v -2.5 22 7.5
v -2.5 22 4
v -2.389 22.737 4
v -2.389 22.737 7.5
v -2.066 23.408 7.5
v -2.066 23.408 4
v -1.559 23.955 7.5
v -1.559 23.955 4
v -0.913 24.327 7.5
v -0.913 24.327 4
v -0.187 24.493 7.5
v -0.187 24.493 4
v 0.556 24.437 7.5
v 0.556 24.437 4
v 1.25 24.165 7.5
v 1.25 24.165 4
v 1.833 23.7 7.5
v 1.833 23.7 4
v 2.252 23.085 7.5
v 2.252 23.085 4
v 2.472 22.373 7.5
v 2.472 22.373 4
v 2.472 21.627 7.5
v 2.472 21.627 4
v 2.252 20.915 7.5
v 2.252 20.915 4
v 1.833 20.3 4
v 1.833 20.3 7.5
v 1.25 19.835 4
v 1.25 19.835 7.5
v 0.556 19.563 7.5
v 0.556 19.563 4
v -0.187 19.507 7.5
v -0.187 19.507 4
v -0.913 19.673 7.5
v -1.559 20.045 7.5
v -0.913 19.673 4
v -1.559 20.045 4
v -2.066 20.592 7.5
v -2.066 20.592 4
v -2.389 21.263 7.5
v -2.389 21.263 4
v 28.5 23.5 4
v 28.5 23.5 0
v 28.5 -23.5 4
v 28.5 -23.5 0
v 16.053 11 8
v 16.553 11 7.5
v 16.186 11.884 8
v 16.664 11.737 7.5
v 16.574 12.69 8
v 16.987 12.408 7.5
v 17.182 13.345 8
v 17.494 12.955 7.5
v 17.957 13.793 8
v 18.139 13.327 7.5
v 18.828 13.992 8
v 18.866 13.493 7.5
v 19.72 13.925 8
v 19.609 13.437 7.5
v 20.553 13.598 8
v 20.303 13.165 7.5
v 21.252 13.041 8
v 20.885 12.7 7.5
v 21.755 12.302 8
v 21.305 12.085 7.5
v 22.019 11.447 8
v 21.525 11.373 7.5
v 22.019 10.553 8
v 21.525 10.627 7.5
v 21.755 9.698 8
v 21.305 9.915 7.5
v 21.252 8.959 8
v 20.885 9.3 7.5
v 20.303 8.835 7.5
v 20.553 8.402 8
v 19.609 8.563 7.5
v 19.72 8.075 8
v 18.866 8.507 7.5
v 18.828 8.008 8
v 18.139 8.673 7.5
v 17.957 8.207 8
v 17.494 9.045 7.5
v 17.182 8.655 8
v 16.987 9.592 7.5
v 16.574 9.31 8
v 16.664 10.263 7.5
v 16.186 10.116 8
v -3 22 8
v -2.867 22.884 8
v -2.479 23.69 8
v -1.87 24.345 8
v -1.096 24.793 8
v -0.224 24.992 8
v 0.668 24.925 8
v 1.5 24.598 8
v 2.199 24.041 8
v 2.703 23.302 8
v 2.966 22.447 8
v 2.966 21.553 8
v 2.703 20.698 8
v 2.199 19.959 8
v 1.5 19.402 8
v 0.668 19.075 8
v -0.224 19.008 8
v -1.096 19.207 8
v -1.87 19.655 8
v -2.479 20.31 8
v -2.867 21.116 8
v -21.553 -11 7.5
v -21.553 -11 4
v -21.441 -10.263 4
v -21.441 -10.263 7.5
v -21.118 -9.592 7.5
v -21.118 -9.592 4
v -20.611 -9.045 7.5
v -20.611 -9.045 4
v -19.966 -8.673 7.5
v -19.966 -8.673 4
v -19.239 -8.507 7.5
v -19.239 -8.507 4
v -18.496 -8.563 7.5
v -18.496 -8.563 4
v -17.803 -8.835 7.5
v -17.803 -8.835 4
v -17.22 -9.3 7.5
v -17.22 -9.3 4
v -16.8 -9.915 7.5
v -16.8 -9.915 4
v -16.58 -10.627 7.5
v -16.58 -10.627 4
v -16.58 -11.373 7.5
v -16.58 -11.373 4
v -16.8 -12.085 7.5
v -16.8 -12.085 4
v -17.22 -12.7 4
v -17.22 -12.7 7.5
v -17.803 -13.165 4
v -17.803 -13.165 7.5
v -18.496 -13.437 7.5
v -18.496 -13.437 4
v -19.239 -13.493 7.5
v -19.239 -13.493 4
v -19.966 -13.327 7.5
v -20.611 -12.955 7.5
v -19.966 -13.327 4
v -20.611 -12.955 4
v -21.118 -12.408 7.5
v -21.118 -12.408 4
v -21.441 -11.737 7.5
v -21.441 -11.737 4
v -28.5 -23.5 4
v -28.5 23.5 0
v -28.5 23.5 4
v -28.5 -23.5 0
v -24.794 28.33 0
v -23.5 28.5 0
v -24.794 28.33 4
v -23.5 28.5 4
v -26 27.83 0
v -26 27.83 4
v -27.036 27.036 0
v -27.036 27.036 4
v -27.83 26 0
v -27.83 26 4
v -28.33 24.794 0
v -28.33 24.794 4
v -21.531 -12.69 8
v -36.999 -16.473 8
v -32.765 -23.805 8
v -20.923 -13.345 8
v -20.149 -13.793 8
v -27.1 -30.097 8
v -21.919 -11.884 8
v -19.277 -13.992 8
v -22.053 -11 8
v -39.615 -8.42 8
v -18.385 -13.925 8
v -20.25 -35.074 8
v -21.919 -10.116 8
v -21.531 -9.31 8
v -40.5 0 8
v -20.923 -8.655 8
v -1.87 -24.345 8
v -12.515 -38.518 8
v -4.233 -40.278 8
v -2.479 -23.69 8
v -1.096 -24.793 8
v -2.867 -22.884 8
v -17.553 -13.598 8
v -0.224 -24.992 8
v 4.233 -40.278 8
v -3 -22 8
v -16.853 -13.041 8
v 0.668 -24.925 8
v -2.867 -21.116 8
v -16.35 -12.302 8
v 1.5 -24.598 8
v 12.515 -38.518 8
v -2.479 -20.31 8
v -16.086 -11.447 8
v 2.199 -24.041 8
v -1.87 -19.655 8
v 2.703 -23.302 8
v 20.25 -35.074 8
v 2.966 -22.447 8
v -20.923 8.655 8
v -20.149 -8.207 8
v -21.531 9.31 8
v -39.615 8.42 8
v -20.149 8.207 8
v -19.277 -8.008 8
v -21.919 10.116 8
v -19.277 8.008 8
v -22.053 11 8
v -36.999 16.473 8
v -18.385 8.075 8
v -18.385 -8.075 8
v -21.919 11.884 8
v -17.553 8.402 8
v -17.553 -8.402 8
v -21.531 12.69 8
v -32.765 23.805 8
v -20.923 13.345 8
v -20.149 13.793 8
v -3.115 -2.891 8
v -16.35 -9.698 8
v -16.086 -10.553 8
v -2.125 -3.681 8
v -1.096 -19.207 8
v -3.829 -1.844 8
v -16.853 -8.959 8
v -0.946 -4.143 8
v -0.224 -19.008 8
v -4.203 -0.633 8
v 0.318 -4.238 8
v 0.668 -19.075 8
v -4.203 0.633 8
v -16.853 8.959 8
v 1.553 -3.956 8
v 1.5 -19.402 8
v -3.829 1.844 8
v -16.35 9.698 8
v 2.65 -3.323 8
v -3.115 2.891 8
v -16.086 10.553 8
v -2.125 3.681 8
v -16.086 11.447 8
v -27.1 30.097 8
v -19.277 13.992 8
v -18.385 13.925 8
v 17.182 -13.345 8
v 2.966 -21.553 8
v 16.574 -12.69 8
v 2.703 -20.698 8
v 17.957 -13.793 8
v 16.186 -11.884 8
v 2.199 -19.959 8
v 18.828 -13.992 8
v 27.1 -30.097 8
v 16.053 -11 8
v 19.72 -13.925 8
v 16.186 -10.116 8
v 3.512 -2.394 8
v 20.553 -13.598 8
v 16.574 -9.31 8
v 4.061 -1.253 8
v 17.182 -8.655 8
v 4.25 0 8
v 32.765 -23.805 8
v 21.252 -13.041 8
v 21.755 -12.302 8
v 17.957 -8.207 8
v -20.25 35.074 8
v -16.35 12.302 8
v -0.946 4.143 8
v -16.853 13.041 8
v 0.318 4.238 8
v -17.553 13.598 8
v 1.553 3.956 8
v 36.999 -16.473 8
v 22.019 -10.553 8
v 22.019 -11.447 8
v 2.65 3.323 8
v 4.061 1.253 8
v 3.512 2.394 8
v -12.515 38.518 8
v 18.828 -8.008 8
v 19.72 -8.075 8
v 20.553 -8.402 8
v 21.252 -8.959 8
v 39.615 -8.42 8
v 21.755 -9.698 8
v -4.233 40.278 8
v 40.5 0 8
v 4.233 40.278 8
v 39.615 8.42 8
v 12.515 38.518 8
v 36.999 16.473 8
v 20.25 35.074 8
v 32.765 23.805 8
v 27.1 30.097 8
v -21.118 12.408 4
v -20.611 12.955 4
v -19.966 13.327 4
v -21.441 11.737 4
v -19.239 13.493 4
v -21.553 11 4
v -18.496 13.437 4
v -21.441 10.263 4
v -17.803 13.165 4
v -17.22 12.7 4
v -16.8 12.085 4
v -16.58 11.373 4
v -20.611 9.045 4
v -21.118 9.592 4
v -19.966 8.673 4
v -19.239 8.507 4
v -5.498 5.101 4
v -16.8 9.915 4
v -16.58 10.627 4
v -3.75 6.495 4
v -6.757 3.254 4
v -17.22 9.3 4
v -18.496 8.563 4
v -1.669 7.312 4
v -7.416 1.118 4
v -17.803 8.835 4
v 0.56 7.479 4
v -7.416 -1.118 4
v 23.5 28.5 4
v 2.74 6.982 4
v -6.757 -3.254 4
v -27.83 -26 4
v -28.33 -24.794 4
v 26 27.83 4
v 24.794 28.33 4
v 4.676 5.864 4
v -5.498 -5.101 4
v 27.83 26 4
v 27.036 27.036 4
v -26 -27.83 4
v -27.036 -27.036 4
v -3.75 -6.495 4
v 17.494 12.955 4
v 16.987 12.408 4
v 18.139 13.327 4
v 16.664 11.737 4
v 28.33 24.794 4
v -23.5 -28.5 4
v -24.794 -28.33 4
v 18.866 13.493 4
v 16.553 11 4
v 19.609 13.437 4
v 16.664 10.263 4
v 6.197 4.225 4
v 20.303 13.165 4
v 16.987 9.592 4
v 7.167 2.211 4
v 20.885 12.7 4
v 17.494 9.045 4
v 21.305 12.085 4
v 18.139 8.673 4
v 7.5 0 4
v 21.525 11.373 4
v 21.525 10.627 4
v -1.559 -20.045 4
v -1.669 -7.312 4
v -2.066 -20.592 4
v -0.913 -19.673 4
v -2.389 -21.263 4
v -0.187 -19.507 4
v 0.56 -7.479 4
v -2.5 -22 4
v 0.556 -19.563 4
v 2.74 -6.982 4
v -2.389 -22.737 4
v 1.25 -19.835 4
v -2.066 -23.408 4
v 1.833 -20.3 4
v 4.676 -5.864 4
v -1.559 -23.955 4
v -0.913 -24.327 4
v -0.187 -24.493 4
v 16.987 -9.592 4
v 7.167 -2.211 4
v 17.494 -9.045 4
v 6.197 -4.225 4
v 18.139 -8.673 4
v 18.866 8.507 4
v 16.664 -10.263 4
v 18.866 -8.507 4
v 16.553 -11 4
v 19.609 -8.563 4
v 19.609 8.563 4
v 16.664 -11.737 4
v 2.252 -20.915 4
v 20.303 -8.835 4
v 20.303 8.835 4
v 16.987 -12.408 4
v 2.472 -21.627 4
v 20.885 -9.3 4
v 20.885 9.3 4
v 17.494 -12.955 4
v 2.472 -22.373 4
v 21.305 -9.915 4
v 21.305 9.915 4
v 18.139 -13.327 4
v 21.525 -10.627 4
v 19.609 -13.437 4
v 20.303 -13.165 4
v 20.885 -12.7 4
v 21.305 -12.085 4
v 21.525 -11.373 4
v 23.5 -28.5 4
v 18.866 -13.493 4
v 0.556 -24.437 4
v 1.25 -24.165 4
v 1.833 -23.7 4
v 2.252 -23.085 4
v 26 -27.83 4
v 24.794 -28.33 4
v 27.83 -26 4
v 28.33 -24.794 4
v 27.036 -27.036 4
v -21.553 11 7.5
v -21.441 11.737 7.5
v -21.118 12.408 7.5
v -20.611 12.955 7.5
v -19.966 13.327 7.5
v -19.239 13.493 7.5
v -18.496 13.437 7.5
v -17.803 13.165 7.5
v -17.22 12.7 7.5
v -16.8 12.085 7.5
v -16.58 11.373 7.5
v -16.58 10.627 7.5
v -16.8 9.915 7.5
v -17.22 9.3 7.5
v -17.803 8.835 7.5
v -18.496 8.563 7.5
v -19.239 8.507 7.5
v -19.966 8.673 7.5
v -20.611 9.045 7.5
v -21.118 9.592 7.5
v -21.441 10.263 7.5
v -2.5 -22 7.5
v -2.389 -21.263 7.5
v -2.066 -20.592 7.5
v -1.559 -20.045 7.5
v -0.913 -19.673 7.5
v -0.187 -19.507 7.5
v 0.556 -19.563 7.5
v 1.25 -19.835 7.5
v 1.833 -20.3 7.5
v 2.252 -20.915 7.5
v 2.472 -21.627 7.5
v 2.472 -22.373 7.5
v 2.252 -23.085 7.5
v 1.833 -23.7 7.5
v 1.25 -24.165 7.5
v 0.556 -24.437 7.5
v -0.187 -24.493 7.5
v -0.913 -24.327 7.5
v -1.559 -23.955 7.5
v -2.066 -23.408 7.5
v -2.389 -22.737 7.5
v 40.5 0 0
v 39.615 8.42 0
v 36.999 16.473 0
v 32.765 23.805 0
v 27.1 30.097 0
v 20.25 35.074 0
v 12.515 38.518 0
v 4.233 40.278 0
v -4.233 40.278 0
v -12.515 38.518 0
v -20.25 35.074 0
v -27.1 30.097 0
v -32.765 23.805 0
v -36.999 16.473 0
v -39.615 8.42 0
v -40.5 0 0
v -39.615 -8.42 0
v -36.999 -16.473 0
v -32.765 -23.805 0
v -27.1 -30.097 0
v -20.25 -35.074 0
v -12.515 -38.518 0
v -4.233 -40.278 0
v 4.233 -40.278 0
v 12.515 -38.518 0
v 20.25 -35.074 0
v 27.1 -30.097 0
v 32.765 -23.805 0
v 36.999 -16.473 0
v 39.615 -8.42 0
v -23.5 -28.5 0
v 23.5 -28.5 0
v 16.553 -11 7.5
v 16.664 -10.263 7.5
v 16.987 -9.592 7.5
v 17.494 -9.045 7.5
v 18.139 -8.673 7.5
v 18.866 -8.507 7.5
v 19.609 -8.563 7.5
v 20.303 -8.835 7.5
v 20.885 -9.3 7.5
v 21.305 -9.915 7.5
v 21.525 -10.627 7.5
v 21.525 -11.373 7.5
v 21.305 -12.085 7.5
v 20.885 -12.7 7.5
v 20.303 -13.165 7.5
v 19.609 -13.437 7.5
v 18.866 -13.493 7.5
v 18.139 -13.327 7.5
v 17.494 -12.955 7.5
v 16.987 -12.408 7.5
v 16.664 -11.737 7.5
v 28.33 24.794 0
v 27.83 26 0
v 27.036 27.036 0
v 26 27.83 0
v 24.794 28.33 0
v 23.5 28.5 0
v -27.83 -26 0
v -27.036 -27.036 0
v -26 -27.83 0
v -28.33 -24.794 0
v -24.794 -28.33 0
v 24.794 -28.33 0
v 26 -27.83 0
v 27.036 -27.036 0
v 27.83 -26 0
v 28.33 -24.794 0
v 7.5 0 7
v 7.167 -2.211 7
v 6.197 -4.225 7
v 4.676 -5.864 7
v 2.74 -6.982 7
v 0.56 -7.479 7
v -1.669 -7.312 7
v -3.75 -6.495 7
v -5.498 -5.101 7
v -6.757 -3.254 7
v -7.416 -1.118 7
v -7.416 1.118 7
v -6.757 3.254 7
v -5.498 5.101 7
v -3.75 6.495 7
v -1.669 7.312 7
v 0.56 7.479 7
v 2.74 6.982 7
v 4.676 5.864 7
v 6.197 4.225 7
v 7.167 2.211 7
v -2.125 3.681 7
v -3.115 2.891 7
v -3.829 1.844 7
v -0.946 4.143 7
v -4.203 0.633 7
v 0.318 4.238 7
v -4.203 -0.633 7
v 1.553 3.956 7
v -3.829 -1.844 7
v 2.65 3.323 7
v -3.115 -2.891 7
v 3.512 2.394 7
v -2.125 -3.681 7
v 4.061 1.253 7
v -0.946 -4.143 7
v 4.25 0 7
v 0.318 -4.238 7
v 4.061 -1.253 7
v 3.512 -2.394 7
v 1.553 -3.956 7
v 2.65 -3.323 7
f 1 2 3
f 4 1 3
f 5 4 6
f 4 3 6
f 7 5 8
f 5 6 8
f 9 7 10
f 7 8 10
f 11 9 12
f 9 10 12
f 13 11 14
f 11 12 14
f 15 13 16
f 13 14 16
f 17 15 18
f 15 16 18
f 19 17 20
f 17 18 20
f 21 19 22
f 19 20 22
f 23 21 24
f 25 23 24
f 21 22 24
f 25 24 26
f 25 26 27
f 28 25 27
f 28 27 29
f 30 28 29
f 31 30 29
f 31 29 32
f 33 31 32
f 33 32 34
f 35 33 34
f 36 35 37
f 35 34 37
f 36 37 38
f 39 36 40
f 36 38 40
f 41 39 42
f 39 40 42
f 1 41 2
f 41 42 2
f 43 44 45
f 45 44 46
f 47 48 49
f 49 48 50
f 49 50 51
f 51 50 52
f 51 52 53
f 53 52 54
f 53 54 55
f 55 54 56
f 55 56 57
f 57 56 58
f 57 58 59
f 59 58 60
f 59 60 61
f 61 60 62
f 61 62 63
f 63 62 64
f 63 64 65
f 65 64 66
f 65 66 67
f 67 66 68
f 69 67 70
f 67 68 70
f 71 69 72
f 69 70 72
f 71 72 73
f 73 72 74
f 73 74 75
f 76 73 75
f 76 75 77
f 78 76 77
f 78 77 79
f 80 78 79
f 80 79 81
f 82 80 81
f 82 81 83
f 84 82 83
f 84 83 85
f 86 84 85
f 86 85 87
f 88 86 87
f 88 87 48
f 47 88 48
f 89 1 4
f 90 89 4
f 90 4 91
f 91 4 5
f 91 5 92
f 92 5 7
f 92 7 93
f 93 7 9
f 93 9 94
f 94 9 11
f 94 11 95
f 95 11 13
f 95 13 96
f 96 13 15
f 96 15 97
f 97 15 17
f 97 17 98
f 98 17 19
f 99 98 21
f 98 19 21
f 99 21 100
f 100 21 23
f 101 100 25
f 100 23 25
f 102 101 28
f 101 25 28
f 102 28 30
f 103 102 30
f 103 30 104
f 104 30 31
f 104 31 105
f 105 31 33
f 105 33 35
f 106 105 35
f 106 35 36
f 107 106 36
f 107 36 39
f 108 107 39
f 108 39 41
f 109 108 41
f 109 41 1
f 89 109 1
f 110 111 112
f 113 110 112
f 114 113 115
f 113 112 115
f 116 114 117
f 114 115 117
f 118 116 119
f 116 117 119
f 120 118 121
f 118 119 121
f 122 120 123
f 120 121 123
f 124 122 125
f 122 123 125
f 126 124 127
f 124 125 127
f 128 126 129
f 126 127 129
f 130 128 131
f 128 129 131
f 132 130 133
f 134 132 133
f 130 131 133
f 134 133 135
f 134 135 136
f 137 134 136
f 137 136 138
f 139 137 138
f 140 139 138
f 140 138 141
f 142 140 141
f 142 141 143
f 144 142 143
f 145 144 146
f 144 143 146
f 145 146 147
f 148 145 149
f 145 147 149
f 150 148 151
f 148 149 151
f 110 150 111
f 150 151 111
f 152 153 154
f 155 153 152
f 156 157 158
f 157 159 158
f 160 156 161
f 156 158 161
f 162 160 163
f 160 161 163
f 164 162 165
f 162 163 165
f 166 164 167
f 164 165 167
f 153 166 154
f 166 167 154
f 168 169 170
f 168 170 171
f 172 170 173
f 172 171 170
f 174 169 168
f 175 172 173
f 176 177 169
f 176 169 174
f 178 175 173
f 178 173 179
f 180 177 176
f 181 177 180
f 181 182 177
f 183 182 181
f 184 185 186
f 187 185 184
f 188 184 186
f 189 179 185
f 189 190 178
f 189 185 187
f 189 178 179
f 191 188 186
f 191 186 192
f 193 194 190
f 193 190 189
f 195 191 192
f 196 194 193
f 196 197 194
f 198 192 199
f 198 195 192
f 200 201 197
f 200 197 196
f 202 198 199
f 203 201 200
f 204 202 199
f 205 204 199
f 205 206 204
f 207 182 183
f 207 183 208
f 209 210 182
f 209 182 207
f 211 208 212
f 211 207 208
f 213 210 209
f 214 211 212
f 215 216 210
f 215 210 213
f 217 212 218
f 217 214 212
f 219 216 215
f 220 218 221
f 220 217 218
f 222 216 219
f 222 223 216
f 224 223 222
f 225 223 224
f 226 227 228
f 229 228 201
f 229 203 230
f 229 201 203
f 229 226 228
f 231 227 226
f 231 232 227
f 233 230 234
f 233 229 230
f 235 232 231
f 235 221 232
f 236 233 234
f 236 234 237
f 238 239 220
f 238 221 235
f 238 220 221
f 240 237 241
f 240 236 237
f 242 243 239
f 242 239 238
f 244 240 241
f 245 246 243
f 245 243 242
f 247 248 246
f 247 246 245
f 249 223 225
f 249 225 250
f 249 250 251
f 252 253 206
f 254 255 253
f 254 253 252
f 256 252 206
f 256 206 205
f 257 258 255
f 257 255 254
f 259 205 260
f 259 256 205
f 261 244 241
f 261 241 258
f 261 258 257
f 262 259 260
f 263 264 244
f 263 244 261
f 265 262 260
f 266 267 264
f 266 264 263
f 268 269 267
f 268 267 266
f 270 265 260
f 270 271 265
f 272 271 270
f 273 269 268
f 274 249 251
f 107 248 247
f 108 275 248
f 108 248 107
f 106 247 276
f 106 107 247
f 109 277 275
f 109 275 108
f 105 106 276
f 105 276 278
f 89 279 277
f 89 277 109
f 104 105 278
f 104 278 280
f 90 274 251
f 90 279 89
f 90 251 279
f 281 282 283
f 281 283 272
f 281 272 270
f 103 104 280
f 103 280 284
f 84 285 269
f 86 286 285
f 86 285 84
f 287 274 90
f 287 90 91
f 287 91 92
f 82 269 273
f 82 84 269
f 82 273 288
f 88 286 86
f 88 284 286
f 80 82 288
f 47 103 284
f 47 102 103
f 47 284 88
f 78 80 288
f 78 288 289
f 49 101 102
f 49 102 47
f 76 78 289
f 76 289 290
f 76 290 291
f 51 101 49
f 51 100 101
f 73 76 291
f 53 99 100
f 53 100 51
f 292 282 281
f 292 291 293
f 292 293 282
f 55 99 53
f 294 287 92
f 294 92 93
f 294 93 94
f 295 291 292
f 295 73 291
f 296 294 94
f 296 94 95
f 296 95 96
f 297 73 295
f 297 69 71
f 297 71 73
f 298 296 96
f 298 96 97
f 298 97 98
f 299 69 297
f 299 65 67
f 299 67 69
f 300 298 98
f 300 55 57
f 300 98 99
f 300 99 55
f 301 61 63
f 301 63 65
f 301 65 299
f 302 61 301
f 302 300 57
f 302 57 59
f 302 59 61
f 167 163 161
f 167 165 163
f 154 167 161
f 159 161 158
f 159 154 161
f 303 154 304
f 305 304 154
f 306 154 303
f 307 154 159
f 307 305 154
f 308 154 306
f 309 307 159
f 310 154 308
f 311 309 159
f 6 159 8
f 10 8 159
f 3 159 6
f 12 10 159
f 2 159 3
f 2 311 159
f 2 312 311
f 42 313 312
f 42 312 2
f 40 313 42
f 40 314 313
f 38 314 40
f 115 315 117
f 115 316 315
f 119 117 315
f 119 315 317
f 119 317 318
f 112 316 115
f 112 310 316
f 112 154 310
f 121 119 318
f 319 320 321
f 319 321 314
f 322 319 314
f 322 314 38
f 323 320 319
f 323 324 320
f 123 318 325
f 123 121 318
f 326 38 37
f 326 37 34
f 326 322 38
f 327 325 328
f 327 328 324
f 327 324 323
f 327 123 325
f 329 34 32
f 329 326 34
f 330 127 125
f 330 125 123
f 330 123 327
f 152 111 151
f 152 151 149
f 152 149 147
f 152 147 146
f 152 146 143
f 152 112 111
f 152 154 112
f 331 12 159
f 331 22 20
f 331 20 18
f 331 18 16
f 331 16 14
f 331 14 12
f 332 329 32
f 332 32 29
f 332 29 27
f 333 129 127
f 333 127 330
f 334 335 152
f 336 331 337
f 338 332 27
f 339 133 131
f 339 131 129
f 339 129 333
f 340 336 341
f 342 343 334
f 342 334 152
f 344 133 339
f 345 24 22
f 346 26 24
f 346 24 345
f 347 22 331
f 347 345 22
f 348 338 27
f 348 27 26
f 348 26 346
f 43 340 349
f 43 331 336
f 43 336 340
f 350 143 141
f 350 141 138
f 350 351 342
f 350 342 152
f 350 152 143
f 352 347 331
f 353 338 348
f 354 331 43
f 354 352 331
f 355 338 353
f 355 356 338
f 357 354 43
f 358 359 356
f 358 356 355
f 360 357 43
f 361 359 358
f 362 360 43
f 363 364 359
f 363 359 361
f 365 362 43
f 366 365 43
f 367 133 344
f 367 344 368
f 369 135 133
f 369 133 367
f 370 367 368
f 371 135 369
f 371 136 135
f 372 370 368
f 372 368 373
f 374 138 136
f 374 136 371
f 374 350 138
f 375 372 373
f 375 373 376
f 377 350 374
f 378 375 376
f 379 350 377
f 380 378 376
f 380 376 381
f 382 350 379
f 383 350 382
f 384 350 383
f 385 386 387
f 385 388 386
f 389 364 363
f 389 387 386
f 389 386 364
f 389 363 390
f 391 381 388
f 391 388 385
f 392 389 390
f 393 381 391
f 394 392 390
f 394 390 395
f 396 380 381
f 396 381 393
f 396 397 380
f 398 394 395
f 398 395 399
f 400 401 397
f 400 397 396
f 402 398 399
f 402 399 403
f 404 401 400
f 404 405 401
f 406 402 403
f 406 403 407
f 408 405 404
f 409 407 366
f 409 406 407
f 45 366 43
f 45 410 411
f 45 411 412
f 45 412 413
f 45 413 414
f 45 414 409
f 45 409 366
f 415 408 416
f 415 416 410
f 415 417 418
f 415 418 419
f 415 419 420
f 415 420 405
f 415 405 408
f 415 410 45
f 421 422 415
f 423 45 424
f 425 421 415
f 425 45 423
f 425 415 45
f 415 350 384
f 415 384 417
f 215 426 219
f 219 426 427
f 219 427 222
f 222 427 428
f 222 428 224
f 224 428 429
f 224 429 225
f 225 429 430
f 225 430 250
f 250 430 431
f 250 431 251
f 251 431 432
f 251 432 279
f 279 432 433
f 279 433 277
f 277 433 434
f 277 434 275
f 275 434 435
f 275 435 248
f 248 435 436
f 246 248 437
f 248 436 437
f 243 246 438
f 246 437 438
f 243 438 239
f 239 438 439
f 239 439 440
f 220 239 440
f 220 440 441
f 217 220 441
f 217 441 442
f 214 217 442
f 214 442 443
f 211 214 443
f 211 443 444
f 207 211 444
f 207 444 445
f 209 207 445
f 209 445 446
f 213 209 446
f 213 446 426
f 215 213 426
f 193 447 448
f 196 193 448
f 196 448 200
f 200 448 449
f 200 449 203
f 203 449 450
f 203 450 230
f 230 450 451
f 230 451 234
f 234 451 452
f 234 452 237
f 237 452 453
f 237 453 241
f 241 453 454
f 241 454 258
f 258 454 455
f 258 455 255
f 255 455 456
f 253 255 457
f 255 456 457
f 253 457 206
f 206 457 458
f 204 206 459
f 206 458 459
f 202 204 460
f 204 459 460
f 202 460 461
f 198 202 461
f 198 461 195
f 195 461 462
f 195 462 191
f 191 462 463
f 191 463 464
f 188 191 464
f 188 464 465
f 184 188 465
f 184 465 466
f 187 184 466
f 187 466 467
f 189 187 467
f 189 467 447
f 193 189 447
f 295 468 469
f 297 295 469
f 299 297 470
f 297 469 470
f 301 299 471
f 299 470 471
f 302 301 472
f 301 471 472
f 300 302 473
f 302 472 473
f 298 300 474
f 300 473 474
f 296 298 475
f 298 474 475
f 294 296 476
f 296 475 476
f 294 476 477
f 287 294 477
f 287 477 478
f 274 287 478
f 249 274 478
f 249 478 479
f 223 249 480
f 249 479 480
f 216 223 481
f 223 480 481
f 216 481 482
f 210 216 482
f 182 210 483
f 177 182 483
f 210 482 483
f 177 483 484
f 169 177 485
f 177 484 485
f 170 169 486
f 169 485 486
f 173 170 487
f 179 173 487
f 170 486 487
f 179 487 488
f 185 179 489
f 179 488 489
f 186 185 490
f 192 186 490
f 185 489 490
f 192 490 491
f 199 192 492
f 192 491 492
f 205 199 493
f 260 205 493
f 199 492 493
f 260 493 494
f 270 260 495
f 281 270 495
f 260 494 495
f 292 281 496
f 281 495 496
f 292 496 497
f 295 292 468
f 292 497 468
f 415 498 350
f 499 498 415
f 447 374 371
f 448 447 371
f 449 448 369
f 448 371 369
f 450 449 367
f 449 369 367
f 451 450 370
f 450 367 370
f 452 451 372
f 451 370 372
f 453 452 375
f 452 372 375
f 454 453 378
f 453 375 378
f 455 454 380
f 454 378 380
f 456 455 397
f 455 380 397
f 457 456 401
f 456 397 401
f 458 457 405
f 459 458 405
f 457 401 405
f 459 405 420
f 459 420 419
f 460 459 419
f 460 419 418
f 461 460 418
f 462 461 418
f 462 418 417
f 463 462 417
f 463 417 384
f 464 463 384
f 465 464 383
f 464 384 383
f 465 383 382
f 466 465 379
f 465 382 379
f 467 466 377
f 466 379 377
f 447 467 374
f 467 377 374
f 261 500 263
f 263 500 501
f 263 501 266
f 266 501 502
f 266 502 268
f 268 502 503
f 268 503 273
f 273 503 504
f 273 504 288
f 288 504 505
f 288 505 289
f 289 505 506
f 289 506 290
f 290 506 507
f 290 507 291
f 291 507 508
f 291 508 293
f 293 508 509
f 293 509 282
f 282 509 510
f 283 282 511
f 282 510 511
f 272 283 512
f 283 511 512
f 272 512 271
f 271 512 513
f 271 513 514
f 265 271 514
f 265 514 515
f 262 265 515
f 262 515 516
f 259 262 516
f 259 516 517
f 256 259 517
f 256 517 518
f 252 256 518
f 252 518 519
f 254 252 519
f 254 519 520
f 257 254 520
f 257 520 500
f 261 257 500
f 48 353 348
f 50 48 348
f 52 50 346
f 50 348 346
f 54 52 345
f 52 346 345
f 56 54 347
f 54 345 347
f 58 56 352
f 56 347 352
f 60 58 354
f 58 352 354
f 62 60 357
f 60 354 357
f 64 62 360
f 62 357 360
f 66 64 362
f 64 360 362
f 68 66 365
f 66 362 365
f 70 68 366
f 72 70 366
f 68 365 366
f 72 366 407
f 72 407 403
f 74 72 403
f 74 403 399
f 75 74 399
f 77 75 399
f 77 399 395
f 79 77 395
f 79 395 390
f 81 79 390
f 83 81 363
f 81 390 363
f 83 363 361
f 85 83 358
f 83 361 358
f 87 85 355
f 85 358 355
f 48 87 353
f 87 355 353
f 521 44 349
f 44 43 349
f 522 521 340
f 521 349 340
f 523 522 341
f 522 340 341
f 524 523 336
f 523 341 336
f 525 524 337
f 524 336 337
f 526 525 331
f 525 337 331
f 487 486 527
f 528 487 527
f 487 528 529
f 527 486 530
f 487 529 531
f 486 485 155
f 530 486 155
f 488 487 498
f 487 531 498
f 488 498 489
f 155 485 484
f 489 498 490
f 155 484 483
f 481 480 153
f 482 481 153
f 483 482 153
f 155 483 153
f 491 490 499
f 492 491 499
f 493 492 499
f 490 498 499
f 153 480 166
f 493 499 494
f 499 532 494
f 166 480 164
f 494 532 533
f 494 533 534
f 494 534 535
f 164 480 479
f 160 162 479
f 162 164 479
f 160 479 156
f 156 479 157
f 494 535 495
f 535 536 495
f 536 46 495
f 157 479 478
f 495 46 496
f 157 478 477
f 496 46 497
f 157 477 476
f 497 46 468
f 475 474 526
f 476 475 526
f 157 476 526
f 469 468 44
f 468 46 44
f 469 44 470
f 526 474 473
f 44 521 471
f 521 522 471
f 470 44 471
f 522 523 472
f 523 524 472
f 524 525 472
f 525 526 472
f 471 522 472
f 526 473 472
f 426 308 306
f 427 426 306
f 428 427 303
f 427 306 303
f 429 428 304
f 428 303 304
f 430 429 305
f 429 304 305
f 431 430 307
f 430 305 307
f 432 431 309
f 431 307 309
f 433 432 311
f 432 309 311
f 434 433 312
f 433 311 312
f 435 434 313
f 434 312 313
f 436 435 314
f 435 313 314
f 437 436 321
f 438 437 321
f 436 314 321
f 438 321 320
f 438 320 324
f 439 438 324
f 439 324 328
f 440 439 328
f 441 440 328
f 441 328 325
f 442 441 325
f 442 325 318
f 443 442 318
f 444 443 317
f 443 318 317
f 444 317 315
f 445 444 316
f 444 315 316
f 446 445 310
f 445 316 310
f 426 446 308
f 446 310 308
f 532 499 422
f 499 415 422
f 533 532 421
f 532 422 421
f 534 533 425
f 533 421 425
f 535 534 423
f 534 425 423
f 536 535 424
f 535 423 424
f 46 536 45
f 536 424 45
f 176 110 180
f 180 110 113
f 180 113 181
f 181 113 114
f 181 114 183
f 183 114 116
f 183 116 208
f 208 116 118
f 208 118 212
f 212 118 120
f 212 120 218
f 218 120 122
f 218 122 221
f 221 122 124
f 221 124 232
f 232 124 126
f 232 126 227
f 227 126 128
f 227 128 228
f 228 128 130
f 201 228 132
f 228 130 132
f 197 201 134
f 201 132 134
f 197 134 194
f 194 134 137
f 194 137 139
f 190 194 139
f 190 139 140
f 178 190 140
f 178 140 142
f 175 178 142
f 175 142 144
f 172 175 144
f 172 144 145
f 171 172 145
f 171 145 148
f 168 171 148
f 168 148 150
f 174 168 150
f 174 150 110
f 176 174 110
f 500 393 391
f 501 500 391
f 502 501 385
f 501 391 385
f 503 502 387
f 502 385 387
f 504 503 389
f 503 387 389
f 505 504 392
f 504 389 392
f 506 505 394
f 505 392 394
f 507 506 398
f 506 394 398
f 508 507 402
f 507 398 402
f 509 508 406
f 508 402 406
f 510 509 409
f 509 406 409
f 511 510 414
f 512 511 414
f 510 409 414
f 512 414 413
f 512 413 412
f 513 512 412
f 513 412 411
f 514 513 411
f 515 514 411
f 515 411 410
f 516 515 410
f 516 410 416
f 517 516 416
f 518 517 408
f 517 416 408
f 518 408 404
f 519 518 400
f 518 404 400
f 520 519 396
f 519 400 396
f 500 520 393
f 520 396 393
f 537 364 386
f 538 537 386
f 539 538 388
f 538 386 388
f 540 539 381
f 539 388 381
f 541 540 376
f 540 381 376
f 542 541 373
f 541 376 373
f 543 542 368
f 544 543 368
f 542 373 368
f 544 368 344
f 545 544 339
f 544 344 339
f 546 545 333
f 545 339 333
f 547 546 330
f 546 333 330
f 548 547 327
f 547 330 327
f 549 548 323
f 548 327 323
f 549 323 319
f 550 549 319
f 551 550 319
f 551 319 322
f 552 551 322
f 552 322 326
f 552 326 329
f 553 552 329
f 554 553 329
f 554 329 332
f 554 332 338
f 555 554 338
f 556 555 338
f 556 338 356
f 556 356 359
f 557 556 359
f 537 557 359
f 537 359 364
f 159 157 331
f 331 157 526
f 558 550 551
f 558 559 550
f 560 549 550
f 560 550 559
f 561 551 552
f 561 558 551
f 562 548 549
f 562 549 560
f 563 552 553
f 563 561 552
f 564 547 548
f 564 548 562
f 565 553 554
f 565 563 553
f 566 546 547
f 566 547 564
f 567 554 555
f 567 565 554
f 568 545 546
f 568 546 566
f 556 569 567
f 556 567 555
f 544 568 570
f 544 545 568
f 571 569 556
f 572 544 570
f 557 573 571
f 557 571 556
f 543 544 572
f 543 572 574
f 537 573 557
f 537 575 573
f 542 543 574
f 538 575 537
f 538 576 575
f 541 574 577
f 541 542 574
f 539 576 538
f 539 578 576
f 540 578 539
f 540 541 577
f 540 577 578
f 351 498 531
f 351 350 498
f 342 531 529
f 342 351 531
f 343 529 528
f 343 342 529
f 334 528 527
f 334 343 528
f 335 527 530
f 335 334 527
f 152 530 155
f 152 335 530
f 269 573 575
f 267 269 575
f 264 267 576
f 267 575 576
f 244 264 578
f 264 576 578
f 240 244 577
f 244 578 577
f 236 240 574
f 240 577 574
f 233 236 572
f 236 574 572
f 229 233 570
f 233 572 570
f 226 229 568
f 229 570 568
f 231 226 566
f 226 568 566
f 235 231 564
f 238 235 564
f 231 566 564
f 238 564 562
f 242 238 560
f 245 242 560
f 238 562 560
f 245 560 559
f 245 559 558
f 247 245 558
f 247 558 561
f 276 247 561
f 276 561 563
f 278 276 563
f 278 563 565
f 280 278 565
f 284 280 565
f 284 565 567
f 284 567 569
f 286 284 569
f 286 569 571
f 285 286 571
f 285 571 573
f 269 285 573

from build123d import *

# Parameters (mm, degrees)
F0_R           = 40.5
F1_DEPTH       = 8
F3_D           = 5
F3_CSINK_D     = 6
F3_CSINK_ANGLE = 90
F4_R           = 7.5
F5_DEPTH       = 7
F6_R           = 4.25
F7_DEPTH       = 1.001
F8_W           = 57
F8_H           = 57
F8_R           = 2.5
F8_R_2         = 7.5
F9_DEPTH       = 4
F10_R          = 5


# Not quite as in the source:
# - a feature names something its author has since deleted; it is built from what else it names


with BuildPart() as f1:
    # F0 (on Top) → F1 (new body)
    with BuildSketch(Plane.XY):
        Circle(F0_R)
    extrude(amount=F1_DEPTH)

    # F3 (through all)
    with Locations(Plane.XY.offset(8)):
        with Locations((0, 22), (19.0525588833, 11), (19.0525588833, -11), (0, -22), (-19.0525588833, -11), (-19.0525588833, 11)):
            CounterSinkHole(F3_D / 2, F3_CSINK_D / 2, counter_sink_angle=F3_CSINK_ANGLE)

    # F4 (on face) → F5 (cut)
    with BuildSketch(Plane(origin=(0, 0, 0), x_dir=(1, 0, 0), z_dir=(0, 0, -1))):
        Circle(F4_R)
    extrude(amount=-F5_DEPTH, mode=Mode.SUBTRACT)

    # F6 (on face) → F7 (cut, through all)
    with BuildSketch(Plane(origin=(0, 0, 7), x_dir=(1, 0, 0), z_dir=(0, 0, -1))):
        Circle(F6_R)
    extrude(amount=-F7_DEPTH, mode=Mode.SUBTRACT)

    # F8 (on face) → F9 (cut)
    with BuildSketch(Plane(origin=(0, 0, 0), x_dir=(1, 0, 0), z_dir=(0, 0, -1))):
        Rectangle(F8_W, F8_H)
        with Locations((-19.0525588833, -11)):
            Circle(F8_R, mode=Mode.SUBTRACT)
        with Locations((0, -22)):
            Circle(F8_R, mode=Mode.SUBTRACT)
        with Locations((19.0525588833, -11)):
            Circle(F8_R, mode=Mode.SUBTRACT)
        with Locations((-19.0525588833, 11)):
            Circle(F8_R, mode=Mode.SUBTRACT)
        Circle(F8_R_2, mode=Mode.SUBTRACT)
        with Locations((19.0525588833, 11)):
            Circle(F8_R, mode=Mode.SUBTRACT)
        with Locations((0, 22)):
            Circle(F8_R, mode=Mode.SUBTRACT)
    extrude(amount=-F9_DEPTH, mode=Mode.SUBTRACT)

    # F10
    f10_edges = [f1.edges().sort_by_distance(p)[0] for p in [
        (28.5, 28.5, 2),
        (28.5, -28.5, 2),
        (-28.5, -28.5, 2),
        (-28.5, 28.5, 2),
    ]]
    fillet(f10_edges, radius=F10_R)


solid = f1.part
